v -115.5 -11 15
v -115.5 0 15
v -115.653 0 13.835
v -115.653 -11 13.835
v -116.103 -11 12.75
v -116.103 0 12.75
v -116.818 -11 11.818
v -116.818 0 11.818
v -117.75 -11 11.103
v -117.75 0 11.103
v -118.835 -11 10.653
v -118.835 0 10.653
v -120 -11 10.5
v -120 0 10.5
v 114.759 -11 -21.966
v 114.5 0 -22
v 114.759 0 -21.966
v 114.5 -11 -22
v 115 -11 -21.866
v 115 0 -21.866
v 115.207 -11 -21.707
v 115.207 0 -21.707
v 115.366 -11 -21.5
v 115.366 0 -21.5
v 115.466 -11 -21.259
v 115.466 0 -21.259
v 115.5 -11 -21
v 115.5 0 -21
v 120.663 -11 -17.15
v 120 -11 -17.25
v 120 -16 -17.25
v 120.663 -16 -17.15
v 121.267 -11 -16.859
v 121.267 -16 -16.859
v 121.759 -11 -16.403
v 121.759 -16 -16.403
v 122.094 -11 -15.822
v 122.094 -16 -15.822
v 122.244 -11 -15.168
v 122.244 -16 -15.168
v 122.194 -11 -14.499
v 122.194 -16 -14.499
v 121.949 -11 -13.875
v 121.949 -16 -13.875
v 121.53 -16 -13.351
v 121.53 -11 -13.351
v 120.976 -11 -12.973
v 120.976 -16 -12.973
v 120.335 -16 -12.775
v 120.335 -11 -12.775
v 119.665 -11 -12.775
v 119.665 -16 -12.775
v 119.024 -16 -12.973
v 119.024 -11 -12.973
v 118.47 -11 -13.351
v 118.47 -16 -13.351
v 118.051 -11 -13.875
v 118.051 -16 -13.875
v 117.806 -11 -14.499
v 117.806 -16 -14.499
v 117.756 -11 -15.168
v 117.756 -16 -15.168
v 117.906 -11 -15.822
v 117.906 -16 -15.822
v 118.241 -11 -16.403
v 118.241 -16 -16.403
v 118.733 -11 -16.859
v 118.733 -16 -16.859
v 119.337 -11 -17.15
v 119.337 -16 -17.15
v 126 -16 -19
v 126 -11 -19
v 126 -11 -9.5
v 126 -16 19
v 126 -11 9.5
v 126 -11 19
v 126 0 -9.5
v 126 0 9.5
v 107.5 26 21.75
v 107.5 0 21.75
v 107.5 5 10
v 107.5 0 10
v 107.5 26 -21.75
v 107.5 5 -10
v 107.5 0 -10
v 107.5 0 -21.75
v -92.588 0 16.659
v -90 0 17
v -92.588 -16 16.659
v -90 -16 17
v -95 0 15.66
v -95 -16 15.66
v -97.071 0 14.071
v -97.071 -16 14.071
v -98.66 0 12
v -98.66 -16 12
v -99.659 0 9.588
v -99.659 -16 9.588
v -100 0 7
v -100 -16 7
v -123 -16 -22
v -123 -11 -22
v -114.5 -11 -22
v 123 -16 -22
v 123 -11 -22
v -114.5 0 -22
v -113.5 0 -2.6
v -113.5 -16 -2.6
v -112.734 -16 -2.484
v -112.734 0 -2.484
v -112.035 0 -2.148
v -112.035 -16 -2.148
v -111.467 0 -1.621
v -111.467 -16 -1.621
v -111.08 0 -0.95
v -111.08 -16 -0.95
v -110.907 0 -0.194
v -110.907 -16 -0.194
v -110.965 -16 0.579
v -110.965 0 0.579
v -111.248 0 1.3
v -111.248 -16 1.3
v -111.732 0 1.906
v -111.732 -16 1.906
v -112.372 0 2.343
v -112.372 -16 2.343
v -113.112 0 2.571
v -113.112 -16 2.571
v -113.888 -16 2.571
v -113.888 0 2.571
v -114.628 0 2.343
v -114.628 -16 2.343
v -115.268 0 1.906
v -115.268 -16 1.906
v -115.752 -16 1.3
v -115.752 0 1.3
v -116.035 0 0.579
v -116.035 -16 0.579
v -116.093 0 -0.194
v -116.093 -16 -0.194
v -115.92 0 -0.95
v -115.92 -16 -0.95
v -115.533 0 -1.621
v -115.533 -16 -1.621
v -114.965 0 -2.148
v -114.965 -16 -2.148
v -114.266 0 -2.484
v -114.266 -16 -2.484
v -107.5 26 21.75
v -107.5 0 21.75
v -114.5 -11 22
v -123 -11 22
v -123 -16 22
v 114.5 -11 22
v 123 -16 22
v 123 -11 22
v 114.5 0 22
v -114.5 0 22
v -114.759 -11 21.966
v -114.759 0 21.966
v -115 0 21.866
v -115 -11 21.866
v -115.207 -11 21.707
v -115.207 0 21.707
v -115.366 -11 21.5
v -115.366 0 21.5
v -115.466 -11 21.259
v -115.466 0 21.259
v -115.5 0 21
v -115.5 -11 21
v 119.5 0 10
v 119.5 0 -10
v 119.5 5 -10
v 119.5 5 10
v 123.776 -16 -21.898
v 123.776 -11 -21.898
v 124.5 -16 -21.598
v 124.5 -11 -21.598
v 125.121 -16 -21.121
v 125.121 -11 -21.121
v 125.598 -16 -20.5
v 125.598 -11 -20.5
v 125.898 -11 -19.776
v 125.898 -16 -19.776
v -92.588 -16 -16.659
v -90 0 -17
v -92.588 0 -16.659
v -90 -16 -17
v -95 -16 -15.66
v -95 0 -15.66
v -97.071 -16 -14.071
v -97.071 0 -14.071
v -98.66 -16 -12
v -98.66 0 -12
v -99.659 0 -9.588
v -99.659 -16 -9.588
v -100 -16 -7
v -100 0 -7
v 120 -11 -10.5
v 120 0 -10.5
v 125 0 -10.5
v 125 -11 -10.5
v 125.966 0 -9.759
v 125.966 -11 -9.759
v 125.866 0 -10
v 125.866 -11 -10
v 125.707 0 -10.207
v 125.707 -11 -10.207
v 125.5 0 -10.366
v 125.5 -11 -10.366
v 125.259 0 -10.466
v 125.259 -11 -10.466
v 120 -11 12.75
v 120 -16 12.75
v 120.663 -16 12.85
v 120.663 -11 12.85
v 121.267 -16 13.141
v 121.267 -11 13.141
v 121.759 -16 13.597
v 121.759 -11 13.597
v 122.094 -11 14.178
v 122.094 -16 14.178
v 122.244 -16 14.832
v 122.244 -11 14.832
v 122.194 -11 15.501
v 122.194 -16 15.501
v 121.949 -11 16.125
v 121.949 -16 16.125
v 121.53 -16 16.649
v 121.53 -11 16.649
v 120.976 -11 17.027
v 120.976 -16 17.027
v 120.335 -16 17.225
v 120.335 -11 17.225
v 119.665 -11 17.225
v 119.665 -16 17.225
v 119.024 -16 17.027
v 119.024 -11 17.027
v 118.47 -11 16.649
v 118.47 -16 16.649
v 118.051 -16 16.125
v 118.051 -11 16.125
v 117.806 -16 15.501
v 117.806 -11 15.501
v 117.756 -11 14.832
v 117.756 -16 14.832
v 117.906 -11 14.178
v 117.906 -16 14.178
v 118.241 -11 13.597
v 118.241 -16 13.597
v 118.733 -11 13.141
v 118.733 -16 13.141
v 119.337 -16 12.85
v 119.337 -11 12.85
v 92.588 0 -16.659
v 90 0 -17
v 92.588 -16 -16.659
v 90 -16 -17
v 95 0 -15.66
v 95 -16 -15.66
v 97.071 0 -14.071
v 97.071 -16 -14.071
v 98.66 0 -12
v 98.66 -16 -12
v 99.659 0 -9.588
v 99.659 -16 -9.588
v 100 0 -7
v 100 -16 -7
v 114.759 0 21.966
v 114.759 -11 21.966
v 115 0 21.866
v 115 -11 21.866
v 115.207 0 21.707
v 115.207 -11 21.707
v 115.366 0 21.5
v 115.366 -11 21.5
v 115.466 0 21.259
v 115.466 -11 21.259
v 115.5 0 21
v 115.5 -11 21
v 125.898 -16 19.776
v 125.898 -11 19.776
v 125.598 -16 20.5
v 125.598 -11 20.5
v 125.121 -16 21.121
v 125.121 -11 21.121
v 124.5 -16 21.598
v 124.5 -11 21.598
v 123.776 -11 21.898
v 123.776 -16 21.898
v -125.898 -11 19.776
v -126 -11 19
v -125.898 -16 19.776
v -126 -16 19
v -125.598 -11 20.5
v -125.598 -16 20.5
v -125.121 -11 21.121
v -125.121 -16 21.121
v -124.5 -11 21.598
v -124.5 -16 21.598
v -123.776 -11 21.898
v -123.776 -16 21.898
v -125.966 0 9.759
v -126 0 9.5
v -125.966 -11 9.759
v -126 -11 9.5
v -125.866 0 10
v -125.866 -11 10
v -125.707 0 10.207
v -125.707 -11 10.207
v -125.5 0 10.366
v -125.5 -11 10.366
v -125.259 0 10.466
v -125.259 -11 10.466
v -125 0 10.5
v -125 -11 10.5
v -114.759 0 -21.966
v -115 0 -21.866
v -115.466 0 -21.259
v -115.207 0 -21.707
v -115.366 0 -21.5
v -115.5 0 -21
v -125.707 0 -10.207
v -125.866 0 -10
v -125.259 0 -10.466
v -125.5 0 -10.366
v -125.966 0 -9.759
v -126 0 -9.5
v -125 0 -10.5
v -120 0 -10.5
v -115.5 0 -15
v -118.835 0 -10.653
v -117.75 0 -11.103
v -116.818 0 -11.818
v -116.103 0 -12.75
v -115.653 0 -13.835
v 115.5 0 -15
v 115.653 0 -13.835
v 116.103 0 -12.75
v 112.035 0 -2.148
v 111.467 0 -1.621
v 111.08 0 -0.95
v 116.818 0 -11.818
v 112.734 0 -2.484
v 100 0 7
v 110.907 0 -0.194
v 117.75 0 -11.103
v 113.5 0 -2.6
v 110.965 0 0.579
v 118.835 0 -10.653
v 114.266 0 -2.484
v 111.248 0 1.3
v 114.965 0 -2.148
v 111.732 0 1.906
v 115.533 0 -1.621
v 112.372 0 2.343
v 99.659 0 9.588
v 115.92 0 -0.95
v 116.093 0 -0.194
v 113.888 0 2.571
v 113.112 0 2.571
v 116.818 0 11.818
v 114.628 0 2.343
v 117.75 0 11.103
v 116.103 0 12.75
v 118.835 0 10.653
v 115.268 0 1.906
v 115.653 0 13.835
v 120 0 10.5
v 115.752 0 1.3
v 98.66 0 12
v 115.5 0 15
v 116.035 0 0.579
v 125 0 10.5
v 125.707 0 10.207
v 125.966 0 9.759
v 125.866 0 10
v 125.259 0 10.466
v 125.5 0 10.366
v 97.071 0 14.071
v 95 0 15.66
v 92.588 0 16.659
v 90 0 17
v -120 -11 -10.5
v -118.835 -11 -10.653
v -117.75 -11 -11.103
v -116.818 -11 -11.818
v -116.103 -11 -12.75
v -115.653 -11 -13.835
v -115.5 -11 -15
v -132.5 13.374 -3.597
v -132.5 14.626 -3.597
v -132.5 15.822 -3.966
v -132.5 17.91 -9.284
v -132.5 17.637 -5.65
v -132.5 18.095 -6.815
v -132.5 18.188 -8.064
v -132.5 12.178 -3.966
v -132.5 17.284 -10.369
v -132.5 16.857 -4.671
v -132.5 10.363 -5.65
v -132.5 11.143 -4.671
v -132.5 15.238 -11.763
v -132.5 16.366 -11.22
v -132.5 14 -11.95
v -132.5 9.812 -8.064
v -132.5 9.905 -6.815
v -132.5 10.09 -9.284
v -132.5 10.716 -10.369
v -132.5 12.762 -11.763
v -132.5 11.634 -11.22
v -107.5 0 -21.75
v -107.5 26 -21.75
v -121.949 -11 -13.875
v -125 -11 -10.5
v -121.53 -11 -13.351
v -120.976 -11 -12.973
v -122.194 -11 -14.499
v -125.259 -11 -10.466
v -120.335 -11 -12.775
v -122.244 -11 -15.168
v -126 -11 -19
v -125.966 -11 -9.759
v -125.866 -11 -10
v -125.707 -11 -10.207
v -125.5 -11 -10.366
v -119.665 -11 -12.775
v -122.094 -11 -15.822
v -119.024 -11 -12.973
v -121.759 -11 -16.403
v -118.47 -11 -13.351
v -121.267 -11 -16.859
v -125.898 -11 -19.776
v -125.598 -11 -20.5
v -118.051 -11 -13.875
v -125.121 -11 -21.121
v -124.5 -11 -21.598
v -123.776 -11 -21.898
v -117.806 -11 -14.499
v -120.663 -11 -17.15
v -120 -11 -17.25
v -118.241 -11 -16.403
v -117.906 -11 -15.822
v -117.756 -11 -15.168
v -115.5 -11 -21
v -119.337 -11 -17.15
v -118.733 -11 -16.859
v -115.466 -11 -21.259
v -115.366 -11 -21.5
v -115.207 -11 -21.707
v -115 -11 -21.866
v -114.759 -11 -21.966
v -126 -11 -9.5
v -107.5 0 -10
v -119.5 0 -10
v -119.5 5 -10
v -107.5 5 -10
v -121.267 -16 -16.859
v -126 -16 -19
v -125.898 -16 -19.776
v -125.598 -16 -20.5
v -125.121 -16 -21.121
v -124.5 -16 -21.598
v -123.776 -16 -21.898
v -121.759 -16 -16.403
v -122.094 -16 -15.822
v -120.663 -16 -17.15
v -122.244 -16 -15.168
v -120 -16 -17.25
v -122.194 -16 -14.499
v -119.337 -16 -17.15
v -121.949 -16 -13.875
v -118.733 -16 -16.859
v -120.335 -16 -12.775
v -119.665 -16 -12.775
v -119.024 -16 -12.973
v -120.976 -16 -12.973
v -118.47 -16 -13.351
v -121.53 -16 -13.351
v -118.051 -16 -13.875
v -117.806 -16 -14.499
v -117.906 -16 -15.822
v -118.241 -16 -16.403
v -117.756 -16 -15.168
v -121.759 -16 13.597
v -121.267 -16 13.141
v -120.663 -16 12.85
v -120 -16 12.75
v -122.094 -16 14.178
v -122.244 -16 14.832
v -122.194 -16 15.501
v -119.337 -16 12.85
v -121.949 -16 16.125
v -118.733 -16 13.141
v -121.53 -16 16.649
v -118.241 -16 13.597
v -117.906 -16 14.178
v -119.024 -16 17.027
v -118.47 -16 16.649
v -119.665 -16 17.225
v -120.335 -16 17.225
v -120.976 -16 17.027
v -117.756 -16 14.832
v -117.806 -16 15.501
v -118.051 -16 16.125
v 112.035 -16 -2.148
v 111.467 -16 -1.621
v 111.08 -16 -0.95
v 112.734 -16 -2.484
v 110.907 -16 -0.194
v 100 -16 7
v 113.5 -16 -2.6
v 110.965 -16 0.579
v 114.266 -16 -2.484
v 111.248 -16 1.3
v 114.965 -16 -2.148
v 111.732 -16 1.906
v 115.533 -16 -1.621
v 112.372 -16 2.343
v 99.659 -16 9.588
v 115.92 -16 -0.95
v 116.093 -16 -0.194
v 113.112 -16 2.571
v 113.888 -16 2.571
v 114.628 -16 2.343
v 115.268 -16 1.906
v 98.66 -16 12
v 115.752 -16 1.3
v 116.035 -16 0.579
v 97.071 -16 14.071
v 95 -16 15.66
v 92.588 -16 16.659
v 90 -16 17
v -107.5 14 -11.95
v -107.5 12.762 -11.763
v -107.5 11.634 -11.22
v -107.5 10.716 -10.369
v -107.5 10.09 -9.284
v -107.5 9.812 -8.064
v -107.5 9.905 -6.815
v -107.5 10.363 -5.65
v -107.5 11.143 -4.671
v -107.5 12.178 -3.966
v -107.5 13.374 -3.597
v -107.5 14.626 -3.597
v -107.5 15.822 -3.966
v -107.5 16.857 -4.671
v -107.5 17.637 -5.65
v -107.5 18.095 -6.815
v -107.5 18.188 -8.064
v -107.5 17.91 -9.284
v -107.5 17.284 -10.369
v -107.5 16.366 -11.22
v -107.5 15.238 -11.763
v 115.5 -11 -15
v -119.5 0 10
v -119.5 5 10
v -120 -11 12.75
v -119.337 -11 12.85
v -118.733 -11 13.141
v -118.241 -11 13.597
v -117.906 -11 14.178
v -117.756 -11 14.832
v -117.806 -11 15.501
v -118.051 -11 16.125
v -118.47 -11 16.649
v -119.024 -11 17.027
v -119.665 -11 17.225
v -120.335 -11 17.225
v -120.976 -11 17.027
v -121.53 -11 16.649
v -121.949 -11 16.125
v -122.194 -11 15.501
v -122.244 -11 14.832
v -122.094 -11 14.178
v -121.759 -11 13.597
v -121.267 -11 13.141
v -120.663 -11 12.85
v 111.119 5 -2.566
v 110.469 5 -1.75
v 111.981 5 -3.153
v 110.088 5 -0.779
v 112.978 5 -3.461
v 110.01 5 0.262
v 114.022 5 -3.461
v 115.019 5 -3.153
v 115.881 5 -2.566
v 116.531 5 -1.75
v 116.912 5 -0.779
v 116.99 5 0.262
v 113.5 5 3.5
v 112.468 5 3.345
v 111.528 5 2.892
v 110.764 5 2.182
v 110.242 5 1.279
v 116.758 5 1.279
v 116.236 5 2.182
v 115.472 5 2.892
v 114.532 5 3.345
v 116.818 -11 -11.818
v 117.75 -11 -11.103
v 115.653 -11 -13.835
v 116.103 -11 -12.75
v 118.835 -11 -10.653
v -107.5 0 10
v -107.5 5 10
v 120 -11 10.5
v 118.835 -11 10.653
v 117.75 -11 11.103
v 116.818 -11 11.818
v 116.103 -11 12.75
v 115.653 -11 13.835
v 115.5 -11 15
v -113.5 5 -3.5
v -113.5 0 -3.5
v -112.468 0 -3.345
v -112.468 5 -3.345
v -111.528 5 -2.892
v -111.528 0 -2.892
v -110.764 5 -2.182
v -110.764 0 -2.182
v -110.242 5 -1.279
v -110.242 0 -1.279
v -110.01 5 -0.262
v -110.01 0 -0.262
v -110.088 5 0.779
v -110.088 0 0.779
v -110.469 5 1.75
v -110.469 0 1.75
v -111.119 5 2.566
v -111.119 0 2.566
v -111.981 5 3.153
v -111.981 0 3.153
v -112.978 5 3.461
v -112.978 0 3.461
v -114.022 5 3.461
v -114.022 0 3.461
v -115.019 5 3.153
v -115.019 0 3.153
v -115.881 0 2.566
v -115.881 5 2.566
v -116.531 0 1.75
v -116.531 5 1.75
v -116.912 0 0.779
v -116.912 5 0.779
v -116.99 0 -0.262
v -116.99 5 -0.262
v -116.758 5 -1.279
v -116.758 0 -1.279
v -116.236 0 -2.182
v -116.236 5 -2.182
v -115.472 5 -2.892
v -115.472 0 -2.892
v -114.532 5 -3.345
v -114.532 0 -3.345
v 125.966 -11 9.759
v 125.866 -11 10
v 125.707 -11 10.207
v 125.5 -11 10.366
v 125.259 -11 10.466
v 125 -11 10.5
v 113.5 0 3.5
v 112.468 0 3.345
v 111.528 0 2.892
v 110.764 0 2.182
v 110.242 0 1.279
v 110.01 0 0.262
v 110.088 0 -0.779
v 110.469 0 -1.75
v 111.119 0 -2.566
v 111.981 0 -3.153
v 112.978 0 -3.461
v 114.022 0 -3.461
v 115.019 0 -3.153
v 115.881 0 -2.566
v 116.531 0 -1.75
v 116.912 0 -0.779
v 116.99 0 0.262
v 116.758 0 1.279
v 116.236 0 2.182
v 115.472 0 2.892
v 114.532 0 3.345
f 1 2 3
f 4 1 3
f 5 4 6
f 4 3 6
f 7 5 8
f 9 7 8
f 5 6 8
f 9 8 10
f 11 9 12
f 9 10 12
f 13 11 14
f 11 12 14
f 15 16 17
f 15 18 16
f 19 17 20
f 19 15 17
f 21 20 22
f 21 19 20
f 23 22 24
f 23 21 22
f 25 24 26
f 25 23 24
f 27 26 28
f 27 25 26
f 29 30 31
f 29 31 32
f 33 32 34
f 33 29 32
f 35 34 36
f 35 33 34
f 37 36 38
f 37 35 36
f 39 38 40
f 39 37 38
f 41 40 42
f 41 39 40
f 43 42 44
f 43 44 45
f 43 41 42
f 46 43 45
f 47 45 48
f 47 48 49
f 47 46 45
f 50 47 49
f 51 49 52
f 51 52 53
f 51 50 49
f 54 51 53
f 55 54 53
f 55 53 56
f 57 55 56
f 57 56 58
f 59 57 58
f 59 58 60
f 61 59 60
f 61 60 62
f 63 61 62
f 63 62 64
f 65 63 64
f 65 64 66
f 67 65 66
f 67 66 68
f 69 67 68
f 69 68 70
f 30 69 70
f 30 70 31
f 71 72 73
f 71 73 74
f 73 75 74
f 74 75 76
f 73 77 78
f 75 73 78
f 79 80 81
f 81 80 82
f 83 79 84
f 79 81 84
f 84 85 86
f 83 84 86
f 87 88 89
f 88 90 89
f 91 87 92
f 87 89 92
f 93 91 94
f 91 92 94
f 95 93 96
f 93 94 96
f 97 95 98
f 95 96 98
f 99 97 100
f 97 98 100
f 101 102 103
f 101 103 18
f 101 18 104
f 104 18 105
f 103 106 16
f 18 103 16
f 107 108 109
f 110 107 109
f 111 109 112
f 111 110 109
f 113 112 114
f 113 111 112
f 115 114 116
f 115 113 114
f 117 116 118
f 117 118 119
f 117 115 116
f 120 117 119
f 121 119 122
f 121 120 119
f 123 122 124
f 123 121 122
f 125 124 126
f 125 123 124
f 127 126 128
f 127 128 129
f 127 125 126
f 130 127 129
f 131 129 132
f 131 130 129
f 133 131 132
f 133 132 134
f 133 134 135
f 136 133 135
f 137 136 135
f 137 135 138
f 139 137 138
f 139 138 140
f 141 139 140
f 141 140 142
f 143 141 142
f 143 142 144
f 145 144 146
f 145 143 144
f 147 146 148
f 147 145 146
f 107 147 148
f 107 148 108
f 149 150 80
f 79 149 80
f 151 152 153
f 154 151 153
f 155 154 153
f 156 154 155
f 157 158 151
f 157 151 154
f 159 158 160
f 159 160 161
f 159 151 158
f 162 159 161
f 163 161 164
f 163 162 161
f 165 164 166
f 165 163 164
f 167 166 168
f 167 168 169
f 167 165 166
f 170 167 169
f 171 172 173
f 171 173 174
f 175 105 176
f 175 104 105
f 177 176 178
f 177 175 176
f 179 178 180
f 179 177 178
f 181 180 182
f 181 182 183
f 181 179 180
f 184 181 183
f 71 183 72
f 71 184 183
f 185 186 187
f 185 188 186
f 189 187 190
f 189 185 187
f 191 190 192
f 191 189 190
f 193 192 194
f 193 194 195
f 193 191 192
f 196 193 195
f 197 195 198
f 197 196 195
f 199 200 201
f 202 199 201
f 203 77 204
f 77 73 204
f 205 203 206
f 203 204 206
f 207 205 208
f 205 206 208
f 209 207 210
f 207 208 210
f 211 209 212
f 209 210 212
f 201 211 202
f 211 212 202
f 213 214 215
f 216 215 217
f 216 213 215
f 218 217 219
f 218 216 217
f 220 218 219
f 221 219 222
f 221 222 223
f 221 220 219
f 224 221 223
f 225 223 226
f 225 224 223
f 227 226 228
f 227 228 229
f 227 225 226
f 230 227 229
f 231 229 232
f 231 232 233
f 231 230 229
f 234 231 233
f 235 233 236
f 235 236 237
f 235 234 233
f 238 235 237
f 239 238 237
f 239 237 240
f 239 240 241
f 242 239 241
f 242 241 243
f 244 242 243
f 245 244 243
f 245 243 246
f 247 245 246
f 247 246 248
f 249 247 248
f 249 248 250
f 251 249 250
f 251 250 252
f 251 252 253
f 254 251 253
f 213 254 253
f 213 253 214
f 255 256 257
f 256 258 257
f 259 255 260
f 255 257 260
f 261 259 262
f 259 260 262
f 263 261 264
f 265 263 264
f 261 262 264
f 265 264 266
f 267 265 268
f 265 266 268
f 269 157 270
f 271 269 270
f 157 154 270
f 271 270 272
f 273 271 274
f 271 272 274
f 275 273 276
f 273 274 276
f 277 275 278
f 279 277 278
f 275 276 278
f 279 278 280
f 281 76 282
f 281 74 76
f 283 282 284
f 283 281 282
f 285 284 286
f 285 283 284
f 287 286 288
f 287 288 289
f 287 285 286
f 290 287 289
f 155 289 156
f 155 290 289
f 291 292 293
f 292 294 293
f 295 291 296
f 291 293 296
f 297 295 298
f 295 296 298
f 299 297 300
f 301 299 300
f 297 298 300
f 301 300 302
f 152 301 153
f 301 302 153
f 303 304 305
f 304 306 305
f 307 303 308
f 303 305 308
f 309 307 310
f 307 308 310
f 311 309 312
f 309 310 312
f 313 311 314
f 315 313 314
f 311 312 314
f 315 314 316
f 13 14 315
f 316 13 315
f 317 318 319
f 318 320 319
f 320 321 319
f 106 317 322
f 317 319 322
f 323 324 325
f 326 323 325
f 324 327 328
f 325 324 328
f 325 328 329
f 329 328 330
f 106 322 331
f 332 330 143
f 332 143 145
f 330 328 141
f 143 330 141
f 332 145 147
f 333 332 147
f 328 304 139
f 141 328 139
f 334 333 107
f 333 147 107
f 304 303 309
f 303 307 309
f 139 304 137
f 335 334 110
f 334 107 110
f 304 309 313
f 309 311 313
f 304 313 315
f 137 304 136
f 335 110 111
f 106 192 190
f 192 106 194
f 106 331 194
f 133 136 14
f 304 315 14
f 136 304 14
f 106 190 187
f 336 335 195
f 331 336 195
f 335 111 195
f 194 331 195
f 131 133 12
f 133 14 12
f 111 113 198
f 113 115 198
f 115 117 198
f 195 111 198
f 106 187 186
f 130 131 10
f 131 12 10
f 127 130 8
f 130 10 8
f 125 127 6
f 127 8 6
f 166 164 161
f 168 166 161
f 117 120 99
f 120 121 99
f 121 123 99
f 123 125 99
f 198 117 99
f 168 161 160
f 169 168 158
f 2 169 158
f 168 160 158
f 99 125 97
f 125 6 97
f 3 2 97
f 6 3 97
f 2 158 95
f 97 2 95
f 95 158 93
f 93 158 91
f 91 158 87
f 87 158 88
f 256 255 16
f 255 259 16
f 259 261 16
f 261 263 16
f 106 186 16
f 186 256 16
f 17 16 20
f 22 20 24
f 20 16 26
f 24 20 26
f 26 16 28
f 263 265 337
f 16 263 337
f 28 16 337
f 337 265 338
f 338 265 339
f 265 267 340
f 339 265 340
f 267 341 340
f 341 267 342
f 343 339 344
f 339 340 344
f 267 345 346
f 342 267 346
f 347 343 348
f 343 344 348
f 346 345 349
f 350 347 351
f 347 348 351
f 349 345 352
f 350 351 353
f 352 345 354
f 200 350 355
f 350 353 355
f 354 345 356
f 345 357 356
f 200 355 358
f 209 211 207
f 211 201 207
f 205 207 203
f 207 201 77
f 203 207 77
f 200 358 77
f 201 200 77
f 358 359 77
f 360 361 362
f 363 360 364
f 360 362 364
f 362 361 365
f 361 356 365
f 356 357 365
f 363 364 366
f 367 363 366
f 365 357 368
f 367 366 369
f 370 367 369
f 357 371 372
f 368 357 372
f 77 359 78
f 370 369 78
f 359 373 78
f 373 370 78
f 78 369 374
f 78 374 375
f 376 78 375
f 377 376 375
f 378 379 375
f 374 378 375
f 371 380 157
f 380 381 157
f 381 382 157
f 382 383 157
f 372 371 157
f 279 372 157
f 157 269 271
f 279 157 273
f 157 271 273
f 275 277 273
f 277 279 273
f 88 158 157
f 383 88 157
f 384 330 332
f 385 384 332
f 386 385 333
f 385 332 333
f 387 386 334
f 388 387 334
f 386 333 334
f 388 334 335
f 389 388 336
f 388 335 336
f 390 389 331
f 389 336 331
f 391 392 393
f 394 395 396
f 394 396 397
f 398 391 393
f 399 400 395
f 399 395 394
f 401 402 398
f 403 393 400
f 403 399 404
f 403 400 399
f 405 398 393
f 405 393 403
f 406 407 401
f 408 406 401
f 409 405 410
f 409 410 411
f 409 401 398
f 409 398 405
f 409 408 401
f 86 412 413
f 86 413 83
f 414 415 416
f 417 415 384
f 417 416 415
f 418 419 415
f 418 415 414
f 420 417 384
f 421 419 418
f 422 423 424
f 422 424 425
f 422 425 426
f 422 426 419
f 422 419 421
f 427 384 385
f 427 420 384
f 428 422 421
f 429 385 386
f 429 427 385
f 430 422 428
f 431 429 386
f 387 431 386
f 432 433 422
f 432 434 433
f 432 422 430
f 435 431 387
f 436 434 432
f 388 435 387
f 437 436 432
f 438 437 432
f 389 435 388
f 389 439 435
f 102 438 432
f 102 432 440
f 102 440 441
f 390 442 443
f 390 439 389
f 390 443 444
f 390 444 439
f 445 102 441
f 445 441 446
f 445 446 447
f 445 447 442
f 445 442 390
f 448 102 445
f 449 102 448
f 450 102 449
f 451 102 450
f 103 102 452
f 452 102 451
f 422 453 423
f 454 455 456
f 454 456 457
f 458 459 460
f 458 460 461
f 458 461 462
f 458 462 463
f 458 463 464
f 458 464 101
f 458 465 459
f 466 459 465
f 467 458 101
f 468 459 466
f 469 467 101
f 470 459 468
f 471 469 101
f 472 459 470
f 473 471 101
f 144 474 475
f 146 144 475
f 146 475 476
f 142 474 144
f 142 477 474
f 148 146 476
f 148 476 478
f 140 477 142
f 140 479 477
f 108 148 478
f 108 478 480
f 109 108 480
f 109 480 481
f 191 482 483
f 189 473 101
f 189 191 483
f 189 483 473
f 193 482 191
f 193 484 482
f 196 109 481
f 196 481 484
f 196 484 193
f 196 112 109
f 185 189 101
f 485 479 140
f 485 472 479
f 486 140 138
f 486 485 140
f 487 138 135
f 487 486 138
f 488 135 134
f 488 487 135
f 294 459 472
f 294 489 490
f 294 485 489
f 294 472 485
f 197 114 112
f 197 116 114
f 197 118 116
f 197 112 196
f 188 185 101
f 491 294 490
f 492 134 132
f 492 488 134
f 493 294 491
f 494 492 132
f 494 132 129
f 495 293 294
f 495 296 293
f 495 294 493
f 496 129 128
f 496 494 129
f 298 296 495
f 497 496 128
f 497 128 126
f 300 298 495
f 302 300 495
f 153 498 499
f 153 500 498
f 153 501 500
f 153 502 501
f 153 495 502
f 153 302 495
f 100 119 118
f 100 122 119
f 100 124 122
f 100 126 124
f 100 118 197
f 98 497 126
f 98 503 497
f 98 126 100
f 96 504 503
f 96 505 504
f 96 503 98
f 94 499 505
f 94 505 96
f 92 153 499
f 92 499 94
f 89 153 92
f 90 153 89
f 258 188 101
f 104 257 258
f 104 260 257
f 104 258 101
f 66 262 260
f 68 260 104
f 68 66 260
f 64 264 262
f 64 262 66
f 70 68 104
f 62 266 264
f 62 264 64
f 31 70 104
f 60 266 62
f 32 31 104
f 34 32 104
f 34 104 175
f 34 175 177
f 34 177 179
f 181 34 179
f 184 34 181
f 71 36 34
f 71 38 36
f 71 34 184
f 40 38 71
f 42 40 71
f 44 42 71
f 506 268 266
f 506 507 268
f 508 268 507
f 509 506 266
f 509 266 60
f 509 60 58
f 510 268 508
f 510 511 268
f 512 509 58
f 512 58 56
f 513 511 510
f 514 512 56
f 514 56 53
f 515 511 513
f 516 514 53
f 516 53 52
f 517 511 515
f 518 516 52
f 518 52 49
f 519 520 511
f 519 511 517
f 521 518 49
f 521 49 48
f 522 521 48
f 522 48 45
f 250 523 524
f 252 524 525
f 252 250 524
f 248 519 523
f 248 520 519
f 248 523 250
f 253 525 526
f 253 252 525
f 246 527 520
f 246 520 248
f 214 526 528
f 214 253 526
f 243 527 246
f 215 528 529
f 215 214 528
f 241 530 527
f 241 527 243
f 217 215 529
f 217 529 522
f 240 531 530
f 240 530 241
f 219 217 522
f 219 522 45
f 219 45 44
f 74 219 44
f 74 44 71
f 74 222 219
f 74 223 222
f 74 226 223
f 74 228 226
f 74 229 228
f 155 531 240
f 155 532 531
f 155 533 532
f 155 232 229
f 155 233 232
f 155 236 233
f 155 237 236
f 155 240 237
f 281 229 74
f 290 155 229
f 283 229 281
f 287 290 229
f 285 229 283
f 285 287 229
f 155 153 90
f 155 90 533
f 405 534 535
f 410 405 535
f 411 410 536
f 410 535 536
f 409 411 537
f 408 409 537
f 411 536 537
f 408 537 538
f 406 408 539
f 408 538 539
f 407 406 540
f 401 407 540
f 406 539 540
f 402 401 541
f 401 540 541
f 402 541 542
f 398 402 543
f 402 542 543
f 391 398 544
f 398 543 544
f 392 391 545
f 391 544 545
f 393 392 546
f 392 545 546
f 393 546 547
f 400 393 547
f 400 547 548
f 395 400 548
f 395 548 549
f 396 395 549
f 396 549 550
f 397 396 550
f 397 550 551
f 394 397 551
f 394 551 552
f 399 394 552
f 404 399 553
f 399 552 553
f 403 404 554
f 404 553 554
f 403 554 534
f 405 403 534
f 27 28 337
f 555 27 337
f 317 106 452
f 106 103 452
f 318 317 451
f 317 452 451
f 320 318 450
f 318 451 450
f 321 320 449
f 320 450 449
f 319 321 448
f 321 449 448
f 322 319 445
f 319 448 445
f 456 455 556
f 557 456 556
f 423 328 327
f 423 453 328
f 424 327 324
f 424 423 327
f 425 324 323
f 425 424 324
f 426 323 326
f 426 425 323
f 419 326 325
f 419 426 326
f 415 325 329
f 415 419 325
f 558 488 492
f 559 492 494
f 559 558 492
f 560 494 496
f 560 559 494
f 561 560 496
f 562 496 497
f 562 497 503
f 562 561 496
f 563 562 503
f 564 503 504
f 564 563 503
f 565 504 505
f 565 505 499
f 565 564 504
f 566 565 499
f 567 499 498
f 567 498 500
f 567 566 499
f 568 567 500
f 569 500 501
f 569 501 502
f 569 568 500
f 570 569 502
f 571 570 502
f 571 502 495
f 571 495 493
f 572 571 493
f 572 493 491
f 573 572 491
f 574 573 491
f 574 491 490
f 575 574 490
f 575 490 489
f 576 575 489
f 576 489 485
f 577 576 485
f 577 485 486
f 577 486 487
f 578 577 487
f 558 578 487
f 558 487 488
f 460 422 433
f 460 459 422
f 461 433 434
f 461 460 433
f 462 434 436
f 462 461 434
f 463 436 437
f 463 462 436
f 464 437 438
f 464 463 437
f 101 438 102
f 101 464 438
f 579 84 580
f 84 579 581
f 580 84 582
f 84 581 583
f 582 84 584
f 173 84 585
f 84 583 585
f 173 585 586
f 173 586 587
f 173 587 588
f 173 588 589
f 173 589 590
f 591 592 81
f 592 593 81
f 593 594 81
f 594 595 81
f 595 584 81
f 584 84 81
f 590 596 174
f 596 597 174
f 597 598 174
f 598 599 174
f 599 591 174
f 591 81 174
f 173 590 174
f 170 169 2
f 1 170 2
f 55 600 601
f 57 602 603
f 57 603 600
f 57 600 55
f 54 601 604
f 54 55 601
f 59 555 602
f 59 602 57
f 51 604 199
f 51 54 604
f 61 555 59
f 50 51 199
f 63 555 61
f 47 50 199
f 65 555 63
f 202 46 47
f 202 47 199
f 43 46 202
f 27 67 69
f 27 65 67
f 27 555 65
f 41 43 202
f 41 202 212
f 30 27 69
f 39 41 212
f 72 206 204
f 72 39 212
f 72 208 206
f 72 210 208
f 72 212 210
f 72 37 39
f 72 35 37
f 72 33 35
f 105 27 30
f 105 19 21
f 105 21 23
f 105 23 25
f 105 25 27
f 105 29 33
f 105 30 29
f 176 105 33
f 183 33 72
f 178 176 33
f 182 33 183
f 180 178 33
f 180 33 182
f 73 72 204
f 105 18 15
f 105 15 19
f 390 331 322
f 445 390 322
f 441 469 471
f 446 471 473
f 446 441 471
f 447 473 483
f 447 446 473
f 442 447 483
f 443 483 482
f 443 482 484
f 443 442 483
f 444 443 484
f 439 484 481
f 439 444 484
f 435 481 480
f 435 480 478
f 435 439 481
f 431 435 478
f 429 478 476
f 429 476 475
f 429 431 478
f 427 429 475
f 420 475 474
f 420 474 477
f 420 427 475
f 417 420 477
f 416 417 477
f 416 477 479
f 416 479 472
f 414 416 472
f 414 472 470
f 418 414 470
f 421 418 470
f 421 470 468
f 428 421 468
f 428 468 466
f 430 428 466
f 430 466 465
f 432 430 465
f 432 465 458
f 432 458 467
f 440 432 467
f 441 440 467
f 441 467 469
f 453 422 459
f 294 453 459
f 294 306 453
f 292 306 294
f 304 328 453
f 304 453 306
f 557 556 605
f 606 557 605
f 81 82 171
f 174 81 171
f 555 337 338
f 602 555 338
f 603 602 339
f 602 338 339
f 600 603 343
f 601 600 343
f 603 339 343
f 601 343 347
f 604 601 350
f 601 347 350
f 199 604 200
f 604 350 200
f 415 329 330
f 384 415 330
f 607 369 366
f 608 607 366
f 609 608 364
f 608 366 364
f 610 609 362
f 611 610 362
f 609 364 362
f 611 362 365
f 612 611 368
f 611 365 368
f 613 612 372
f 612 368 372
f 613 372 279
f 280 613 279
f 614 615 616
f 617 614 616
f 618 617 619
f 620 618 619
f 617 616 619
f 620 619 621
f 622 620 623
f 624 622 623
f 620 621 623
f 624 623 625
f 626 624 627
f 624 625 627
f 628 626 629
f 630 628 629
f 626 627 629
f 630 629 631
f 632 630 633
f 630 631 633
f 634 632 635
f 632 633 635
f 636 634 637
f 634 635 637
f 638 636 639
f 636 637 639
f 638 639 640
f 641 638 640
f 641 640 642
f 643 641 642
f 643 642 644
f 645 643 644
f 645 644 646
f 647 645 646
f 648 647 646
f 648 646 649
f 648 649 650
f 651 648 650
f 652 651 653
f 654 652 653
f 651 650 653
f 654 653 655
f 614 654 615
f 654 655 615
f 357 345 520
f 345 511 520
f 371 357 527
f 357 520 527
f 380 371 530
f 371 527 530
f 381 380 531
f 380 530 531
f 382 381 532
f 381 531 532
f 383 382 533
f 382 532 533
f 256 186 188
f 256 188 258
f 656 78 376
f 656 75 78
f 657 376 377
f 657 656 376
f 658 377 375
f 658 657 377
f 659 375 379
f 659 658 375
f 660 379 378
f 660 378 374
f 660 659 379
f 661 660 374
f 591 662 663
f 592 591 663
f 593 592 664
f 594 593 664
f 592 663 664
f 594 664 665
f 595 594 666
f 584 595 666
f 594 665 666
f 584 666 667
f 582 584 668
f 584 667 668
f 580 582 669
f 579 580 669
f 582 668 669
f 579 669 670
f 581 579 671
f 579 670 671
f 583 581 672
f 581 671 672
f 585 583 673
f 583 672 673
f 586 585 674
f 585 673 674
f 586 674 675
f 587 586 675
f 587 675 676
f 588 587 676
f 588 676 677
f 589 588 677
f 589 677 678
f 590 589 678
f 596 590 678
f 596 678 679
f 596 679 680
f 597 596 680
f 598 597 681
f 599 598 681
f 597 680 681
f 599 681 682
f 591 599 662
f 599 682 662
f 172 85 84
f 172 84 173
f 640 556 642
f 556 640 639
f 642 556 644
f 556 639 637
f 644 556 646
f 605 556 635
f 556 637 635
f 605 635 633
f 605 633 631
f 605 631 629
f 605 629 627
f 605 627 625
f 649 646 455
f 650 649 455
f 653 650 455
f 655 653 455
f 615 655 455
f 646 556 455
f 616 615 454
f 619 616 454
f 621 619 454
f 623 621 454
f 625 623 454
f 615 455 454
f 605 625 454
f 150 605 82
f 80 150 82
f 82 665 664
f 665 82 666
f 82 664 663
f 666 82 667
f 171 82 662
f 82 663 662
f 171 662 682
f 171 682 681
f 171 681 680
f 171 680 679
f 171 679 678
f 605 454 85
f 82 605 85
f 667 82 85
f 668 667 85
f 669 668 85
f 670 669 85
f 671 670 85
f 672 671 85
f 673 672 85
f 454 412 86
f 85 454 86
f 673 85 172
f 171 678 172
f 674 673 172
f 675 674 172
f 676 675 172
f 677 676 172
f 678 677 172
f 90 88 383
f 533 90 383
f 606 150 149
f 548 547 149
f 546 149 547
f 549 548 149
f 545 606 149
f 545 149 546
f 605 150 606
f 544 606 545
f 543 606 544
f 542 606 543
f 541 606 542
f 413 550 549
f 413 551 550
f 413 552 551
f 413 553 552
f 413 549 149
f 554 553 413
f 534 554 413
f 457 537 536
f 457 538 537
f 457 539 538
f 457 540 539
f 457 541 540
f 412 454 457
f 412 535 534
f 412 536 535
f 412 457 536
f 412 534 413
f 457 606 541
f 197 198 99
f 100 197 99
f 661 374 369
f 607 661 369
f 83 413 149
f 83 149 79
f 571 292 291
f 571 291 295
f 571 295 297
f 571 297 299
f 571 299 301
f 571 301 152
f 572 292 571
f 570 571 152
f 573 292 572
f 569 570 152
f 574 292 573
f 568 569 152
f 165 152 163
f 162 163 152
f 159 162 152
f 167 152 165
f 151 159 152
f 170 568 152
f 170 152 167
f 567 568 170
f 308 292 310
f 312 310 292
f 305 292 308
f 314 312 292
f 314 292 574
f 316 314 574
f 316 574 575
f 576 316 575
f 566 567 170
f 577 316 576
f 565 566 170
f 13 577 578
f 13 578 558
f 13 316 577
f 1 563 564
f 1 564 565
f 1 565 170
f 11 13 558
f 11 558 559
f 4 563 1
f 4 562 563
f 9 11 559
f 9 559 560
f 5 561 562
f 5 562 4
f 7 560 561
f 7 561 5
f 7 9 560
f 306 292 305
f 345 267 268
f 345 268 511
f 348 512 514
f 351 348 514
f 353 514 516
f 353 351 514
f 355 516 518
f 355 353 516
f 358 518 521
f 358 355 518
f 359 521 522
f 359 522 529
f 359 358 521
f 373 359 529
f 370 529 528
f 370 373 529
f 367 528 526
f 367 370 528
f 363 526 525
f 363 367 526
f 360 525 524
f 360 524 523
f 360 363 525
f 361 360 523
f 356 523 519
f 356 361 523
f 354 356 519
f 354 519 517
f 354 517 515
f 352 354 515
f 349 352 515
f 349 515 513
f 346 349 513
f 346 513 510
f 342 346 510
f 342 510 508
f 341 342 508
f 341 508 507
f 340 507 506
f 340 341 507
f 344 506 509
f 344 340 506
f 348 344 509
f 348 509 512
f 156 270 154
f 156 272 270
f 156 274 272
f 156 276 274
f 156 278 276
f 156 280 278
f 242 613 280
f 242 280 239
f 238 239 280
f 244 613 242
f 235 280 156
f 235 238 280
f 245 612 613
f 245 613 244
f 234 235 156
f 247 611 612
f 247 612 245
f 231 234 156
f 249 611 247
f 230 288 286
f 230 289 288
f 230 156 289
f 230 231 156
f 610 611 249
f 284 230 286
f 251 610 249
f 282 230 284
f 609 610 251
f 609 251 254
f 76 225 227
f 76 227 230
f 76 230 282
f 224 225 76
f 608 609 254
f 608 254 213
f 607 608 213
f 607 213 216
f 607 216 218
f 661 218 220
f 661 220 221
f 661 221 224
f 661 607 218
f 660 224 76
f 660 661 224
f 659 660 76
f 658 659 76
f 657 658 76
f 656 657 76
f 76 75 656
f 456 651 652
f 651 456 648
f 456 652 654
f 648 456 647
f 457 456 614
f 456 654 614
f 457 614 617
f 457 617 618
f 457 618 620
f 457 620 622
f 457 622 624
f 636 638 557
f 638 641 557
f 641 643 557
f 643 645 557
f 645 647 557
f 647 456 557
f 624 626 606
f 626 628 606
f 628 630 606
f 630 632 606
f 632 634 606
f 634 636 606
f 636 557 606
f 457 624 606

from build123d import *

# Parameters (mm, degrees)
SKETCH_1_W          = 215
SKETCH_1_H          = 43.5
EXTRUDE_1_DEPTH     = 26
SKETCH_2_W          = 12
SKETCH_2_H          = 20
SKETCH_2_R          = 3.5
EXTRUDE_2_DEPTH     = 5
SKETCH_3_R          = 4.2
EXTRUDE_3_DEPTH     = 25
SKETCH_4_W          = 252
SKETCH_4_H          = 44
SKETCH_4_R          = 2.25
SKETCH_4_R_2        = 2.6
SKETCH_4_W_2        = 200
SKETCH_4_H_2        = 34
EXTRUDE_4_DEPTH     = 16
SKETCH_5_R          = 2.25
CUT_EXTRUDE_1_DEPTH = 11
FILLET_1_R          = 3
FILLET_2_R          = 10
FILLET_3_R          = 1


with BuildPart() as part:
    # ｽｹｯﾁ1 → ﾎﾞｽ - 押し出し1 (new body)
    with BuildSketch(Plane(origin=(0, 0, 0), x_dir=(1, 0, 0), z_dir=(0, 1, 0))):
        Rectangle(SKETCH_1_W, SKETCH_1_H)
    extrude(amount=EXTRUDE_1_DEPTH)

    # ｽｹｯﾁ2 → ﾎﾞｽ - 押し出し2 (add)
    # profile 1 of 2: a face of its own
    with BuildSketch(Plane.XZ):
        with Locations((-113.5, 0)):
            Rectangle(SKETCH_2_W, SKETCH_2_H)
        with Locations(Location((-113.5, 0, 0), (0, 0, 270))):
            Circle(SKETCH_2_R, mode=Mode.SUBTRACT)
    # profile 2 of 2: a face of its own
    with BuildSketch(Plane.XZ):
        with Locations((113.5, 0)):
            Rectangle(SKETCH_2_W, SKETCH_2_H)
        with Locations(Location((113.5, 0, 0), (0, 0, 90))):
            Circle(SKETCH_2_R, mode=Mode.SUBTRACT)
    extrude(amount=-EXTRUDE_2_DEPTH)

    # ｽｹｯﾁ3 → ﾎﾞｽ - 押し出し3 (add)
    with BuildSketch(Plane.ZY.offset(107.5)):
        with Locations(Location((-7.75, 14, 0), (0, 0, 180))):
            Circle(SKETCH_3_R)
    extrude(amount=EXTRUDE_3_DEPTH)


with BuildPart() as body_2:
    # ｽｹｯﾁ4 → ﾎﾞｽ - 押し出し4 (new body)
    with BuildSketch(Plane.XZ):
        Rectangle(SKETCH_4_W, SKETCH_4_H)
        with Locations(Location((-120, -15, 0), (0, 0, 270))):
            Circle(SKETCH_4_R, mode=Mode.SUBTRACT)
        with Locations(Location((-120, 15, 0), (0, 0, 270))):
            Circle(SKETCH_4_R, mode=Mode.SUBTRACT)
        with Locations(Location((120, 15, 0), (0, 0, 270))):
            Circle(SKETCH_4_R, mode=Mode.SUBTRACT)
        with Locations(Location((120, -15, 0), (0, 0, 270))):
            Circle(SKETCH_4_R, mode=Mode.SUBTRACT)
        with Locations(Location((-113.5, 0, 0), (0, 0, 270))):
            Circle(SKETCH_4_R_2, mode=Mode.SUBTRACT)
        with Locations(Location((113.5, 0, 0), (0, 0, 270))):
            Circle(SKETCH_4_R_2, mode=Mode.SUBTRACT)
        Rectangle(SKETCH_4_W_2, SKETCH_4_H_2, mode=Mode.SUBTRACT)
    extrude(amount=EXTRUDE_4_DEPTH)

    # ｽｹｯﾁ5 → ｶｯﾄ - 押し出し1 (cut)
    # profile 1 of 4: a face of its own
    with BuildSketch(Plane(origin=(0, 0, 0), x_dir=(1, 0, 0), z_dir=(0, 1, 0))):
        with BuildLine():
            Line((-126, -10.5), (-126, -22))
            Line((-126, -22), (-115.5, -22))
            Line((-115.5, -22), (-115.5, -15))
            ThreePointArc((-115.5, -15), (-116.818019485, -11.818019485), (-120, -10.5))
            Line((-120, -10.5), (-126, -10.5))
        make_face()
        with Locations(Location((-120, -15, 0), (0, 0, 270))):
            Circle(SKETCH_5_R, mode=Mode.SUBTRACT)
    # profile 2 of 4: a face of its own
    with BuildSketch(Plane(origin=(0, 0, 0), x_dir=(1, 0, 0), z_dir=(0, 1, 0))):
        with BuildLine():
            Line((115.5, -15), (115.5, -22))
            Line((115.5, -22), (126, -22))
            Line((126, -22), (126, -10.5))
            Line((126, -10.5), (120, -10.5))
            ThreePointArc((120, -10.5), (116.818019485, -11.818019485), (115.5, -15))
        make_face()
        with Locations(Location((120, -15, 0), (0, 0, 270))):
            Circle(SKETCH_5_R, mode=Mode.SUBTRACT)
    # profile 3 of 4: a face of its own
    with BuildSketch(Plane(origin=(0, 0, 0), x_dir=(1, 0, 0), z_dir=(0, 1, 0))):
        with BuildLine():
            Line((-126, 22), (-126, 10.5))
            Line((-126, 10.5), (-120, 10.5))
            ThreePointArc((-120, 10.5), (-116.818019485, 11.818019485), (-115.5, 15))
            Line((-115.5, 15), (-115.5, 22))
            Line((-115.5, 22), (-126, 22))
        make_face()
        with Locations(Location((-120, 15, 0), (0, 0, 270))):
            Circle(SKETCH_5_R, mode=Mode.SUBTRACT)
    # profile 4 of 4: a face of its own
    with BuildSketch(Plane(origin=(0, 0, 0), x_dir=(1, 0, 0), z_dir=(0, 1, 0))):
        with BuildLine():
            Line((120, 10.5), (126, 10.5))
            Line((126, 10.5), (126, 22))
            Line((126, 22), (115.5, 22))
            Line((115.5, 22), (115.5, 15))
            ThreePointArc((115.5, 15), (116.818019485, 11.818019485), (120, 10.5))
        make_face()
        with Locations(Location((120, 15, 0), (0, 0, 270))):
            Circle(SKETCH_5_R, mode=Mode.SUBTRACT)
    extrude(amount=-CUT_EXTRUDE_1_DEPTH, mode=Mode.SUBTRACT)

    # ﾌｨﾚｯﾄ1
    fillet_1_edges = [body_2.edges().sort_by_distance(p)[0] for p in [
        (-126, -13.5, 22),
        (126, -13.5, 22),
        (126, -13.5, -22),
        (-126, -13.5, -22),
    ]]
    fillet(fillet_1_edges, radius=FILLET_1_R)

    # ﾌｨﾚｯﾄ2
    fillet_2_edges = [body_2.edges().sort_by_distance(p)[0] for p in [
        (-100, -8, 17),
        (-100, -8, -17),
        (100, -8, -17),
        (100, -8, 17),
    ]]
    fillet(fillet_2_edges, radius=FILLET_2_R)

    # ﾌｨﾚｯﾄ3
    fillet_3_edges = [body_2.edges().sort_by_distance(p)[0] for p in [
        (126, -5.5, 10.5),
        (115.5, -5.5, 22),
        (-126, -5.5, -10.5),
        (-115.5, -5.5, -22),
        (-115.5, -5.5, 22),
        (-126, -5.5, 10.5),
        (126, -5.5, -10.5),
        (115.5, -5.5, -22),
    ]]
    fillet(fillet_3_edges, radius=FILLET_3_R)


solid = Compound([part.part, body_2.part])
